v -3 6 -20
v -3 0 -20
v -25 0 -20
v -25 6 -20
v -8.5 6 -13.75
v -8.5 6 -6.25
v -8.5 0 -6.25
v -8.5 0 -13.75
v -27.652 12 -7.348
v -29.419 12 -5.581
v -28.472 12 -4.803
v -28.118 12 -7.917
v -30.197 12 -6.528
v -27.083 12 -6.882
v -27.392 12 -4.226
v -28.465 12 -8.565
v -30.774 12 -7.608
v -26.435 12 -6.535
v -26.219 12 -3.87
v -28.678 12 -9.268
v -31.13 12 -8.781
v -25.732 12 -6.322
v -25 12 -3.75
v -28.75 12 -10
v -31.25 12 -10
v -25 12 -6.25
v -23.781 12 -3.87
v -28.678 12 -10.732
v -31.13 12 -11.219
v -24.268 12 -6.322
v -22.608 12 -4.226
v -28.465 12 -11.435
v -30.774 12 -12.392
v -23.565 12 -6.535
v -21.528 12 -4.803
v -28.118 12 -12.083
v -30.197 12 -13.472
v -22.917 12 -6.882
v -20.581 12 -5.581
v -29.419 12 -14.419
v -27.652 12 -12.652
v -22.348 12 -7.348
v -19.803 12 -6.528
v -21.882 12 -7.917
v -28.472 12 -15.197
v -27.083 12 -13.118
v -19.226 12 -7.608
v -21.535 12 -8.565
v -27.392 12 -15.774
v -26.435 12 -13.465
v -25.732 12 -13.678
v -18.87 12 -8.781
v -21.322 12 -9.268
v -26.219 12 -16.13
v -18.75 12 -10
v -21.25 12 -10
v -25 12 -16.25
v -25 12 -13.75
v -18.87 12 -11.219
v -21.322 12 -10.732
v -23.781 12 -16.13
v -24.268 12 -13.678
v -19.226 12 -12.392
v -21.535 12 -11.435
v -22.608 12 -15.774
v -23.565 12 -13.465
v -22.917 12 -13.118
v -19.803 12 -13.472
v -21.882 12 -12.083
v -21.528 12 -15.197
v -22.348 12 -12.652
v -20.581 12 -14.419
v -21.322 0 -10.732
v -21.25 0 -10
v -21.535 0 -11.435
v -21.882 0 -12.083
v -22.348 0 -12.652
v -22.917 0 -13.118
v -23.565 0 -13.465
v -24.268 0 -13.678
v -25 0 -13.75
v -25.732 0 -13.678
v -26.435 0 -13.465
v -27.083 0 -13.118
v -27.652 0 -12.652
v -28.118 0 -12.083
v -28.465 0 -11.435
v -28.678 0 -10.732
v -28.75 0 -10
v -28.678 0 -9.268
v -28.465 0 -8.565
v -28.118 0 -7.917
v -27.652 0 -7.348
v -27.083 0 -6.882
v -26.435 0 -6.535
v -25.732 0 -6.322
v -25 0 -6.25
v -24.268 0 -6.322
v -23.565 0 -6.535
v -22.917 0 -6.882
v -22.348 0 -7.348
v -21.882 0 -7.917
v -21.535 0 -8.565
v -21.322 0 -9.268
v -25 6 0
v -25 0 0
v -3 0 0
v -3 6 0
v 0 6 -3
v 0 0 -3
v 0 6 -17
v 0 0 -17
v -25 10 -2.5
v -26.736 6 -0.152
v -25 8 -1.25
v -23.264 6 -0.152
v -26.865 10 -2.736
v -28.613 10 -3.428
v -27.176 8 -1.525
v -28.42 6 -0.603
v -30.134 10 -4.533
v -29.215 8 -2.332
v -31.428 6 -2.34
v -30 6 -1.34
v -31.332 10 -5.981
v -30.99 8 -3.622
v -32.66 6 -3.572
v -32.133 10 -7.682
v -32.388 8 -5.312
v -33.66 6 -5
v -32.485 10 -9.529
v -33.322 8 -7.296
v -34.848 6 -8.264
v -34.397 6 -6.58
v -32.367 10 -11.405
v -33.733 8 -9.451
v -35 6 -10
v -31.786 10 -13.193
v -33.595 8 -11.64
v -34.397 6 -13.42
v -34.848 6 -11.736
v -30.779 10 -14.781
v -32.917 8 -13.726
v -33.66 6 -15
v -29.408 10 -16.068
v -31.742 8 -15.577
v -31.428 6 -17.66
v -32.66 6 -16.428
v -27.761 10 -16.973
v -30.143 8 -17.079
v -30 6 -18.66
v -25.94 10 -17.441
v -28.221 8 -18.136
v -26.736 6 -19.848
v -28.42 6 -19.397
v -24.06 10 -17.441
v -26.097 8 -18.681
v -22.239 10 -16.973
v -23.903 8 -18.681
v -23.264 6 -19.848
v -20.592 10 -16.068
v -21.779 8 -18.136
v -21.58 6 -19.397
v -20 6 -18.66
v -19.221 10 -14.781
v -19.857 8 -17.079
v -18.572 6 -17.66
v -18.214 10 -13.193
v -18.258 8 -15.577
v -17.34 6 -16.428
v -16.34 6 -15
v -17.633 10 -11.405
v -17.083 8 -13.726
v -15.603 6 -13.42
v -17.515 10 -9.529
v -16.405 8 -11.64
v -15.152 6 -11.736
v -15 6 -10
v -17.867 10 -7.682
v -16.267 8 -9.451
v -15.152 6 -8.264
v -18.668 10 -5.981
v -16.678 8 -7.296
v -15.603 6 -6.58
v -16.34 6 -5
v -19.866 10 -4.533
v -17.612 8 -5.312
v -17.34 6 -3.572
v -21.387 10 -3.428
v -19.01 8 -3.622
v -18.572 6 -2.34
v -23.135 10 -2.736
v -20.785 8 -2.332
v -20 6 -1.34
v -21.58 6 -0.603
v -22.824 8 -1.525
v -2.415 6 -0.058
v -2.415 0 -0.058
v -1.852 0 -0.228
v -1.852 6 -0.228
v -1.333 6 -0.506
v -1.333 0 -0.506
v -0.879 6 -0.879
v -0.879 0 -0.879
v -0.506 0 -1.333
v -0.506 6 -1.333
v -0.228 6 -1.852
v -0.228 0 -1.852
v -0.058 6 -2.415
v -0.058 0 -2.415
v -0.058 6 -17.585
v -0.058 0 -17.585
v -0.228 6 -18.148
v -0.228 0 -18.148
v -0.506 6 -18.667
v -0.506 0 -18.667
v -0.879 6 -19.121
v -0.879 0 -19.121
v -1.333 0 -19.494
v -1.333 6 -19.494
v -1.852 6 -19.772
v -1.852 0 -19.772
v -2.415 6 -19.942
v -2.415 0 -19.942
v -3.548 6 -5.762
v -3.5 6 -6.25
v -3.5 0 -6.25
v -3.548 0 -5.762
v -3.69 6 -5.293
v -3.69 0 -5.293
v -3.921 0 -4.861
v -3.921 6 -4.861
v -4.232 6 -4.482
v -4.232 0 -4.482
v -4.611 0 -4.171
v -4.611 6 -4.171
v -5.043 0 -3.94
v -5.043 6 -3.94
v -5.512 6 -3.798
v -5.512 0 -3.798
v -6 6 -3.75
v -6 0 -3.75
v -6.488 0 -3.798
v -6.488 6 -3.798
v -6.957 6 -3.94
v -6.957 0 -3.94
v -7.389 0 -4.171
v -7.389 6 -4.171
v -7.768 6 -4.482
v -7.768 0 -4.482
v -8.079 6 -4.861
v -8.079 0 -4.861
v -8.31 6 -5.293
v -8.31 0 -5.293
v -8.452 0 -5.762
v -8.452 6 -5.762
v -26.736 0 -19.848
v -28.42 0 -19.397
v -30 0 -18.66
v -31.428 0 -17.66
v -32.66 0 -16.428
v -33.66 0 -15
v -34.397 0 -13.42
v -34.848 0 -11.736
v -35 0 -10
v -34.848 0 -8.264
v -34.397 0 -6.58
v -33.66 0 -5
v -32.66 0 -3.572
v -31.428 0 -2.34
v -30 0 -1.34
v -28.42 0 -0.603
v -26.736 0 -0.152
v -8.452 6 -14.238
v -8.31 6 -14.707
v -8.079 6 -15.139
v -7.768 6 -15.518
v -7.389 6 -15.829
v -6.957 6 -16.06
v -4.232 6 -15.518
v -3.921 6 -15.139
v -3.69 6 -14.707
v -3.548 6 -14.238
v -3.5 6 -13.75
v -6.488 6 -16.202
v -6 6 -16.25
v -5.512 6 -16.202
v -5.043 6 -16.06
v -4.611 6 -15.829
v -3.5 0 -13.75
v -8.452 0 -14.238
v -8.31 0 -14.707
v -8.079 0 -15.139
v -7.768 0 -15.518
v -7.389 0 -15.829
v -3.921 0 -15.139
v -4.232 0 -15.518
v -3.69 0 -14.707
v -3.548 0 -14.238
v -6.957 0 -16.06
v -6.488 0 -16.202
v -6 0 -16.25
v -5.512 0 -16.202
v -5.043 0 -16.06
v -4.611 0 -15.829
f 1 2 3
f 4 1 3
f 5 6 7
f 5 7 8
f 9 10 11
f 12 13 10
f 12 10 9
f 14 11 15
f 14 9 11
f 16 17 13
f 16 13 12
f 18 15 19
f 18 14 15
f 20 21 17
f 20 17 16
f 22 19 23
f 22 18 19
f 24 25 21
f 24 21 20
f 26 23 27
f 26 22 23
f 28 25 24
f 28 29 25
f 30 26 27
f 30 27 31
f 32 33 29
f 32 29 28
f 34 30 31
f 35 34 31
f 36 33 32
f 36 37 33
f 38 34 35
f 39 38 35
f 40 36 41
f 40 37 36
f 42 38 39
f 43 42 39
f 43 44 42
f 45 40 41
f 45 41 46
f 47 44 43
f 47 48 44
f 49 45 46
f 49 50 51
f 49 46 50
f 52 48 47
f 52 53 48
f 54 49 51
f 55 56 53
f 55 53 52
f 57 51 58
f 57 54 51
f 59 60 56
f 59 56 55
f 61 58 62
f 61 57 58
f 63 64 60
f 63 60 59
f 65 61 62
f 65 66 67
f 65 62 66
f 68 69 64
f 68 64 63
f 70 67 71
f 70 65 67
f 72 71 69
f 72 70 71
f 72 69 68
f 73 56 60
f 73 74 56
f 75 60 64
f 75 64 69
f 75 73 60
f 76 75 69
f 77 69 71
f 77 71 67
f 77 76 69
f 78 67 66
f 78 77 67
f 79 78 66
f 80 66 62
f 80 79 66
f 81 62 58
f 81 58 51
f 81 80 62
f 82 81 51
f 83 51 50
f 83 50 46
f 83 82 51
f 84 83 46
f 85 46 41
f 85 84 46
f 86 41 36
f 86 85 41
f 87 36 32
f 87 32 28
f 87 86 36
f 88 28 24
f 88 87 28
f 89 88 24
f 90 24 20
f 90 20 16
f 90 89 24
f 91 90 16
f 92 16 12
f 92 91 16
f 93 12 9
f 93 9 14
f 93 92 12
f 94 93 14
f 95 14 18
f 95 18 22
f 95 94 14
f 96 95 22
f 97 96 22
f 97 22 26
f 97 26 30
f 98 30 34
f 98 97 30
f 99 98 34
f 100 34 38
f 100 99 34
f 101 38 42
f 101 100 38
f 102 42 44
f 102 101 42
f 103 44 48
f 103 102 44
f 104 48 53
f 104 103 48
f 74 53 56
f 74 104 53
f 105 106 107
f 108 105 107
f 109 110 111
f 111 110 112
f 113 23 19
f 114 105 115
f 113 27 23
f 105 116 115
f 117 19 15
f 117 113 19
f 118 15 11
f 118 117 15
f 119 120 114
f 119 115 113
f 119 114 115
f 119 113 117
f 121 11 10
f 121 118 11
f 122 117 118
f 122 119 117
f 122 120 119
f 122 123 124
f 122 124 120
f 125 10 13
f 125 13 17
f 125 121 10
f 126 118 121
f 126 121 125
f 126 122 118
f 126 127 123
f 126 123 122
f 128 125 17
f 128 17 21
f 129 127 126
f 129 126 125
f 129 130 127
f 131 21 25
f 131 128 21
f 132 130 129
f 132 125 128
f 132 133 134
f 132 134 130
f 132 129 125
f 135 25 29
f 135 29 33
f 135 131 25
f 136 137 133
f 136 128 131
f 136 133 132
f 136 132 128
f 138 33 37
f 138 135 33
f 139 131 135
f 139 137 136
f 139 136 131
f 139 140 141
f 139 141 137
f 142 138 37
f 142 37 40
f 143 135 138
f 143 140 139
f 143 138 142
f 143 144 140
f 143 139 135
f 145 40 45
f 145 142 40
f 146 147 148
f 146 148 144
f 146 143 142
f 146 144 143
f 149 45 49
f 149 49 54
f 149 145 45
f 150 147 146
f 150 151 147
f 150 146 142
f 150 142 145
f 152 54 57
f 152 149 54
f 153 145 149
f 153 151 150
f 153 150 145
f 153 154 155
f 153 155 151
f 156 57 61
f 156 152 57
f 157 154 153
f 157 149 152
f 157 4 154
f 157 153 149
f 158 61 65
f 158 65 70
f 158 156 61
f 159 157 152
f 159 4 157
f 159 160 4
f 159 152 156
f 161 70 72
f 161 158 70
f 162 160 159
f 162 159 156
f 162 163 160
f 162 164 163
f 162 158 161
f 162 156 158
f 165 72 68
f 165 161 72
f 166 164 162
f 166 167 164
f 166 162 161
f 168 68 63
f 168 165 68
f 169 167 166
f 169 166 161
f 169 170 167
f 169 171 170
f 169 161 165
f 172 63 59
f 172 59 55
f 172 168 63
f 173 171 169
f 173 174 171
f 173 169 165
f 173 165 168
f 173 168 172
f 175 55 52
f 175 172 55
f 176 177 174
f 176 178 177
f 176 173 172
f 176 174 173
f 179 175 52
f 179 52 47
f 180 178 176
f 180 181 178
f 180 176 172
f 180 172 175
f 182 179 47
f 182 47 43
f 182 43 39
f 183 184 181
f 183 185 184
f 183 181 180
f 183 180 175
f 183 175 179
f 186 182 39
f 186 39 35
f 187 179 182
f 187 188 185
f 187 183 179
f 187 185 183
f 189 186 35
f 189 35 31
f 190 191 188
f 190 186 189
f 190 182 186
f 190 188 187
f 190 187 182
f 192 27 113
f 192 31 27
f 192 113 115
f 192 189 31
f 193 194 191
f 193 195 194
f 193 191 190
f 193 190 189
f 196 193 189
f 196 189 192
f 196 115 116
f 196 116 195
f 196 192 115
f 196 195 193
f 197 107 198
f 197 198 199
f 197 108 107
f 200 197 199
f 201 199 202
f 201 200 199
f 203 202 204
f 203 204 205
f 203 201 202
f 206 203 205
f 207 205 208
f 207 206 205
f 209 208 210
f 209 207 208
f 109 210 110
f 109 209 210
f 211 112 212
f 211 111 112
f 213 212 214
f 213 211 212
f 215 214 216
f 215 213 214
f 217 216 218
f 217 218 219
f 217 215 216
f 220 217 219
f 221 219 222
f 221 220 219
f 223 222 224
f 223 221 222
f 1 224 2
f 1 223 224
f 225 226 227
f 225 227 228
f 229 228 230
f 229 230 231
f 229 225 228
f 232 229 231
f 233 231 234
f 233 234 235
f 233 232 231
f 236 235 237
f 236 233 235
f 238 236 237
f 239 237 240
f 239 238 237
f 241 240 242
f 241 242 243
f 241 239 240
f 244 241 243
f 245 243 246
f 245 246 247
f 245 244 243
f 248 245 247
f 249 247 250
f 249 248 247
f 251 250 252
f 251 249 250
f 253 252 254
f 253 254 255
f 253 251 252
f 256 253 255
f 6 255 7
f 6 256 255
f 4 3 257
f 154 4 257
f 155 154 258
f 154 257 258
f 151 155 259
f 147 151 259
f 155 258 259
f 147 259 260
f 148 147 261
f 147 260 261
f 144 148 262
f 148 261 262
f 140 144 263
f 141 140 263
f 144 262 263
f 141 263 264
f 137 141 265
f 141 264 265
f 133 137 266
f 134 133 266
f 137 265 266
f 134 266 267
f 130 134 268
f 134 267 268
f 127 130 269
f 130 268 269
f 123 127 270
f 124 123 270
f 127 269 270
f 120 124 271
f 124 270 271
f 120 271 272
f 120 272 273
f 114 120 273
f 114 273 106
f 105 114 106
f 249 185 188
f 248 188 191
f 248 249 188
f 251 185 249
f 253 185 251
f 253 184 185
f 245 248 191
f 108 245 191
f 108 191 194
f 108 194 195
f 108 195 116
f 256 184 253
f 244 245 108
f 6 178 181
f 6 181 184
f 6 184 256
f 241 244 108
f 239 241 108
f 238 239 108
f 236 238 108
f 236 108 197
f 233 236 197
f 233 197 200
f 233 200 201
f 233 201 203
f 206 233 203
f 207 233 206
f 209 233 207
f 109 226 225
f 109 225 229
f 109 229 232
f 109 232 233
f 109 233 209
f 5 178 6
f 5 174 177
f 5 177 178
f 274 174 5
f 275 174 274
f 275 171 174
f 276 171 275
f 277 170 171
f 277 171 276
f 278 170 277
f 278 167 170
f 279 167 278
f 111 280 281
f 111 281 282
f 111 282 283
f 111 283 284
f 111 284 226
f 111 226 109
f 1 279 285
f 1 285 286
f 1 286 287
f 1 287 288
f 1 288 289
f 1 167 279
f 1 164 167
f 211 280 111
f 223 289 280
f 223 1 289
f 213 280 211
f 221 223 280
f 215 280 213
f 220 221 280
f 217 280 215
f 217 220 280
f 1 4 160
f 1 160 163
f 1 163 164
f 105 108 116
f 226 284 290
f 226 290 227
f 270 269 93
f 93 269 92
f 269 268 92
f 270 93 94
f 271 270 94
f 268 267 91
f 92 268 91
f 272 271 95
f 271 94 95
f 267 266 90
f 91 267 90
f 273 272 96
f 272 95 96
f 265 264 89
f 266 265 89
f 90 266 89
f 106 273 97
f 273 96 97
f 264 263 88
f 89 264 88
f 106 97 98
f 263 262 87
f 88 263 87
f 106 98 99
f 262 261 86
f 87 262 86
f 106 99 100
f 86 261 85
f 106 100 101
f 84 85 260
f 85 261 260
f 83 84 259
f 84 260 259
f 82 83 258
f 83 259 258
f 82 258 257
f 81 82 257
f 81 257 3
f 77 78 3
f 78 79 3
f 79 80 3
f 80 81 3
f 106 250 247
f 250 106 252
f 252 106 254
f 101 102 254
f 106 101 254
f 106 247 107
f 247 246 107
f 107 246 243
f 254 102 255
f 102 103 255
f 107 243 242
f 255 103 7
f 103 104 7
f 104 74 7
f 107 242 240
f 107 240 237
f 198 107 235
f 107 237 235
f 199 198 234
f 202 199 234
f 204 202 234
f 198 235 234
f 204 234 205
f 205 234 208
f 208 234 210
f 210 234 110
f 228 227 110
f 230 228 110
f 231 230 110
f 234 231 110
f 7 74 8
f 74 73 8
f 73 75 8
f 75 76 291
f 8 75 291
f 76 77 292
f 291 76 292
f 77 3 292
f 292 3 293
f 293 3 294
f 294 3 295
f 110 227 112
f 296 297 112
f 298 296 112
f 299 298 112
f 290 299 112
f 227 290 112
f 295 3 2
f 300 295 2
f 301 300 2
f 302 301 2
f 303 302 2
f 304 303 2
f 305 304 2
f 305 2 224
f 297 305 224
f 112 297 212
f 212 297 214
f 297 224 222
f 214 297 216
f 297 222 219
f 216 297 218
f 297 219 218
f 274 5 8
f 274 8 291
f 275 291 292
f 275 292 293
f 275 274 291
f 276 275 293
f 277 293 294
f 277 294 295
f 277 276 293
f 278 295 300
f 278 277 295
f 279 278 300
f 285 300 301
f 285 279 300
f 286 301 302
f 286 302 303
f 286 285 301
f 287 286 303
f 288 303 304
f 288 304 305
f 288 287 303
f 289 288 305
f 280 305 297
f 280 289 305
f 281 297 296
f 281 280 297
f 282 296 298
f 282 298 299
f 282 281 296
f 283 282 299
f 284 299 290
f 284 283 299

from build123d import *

# Parameters (mm, degrees)
Y_KSEKLIK_EKSTR_ZYON1_DEPTH = 6
IZIM2_R                     = 6.25
IZIM2_R_2                   = 3.75
Y_KSEKLIK_EKSTR_ZYON2_DEPTH = 6
KES_EKSTR_ZYON1_DEPTH       = 6
IZIM5_R                     = 3.75
KES_EKSTR_ZYON2_DEPTH       = 6
RADYUS1_R                   = 3
RADYUS2_R                   = 3


with BuildPart() as part:
    # Çizim1 → Yükseklik-Ekstrüzyon1 (new body)
    with BuildSketch(Plane(origin=(0, 0, 0), x_dir=(1, 0, 0), z_dir=(0, 1, 0))):
        with BuildLine():
            ThreePointArc((-25, 20), (-35, 10), (-25, 0))
            Line((-25, 0), (-25, 20))
        make_face()
        with BuildLine():
            Line((-25, 20), (-25, 0))
            ThreePointArc((-25, 0), (-17.928932188, 2.928932188), (-15, 10))
            ThreePointArc((-15, 10), (-17.928932188, 17.071067812), (-25, 20))
        make_face()
        with BuildLine():
            Line((-25, 0), (0, 0))
            Line((0, 0), (0, 20))
            Line((0, 20), (-25, 20))
            ThreePointArc((-25, 20), (-17.928932188, 17.071067812), (-15, 10))
            ThreePointArc((-15, 10), (-17.928932188, 2.928932188), (-25, 0))
        make_face()
    extrude(amount=Y_KSEKLIK_EKSTR_ZYON1_DEPTH)

    # Çizim2 → Yükseklik-Ekstrüzyon2 (add)
    with BuildSketch(Plane(origin=(0, 6, 0), x_dir=(1, 0, 0), z_dir=(0, 1, 0))):
        with Locations((-25, 10)):
            Circle(IZIM2_R)
        with Locations((-25, 10)):
            Circle(IZIM2_R_2, mode=Mode.SUBTRACT)
    extrude(amount=Y_KSEKLIK_EKSTR_ZYON2_DEPTH)

    # Çizim4 → Kes-Ekstrüzyon1 (cut)
    with BuildSketch(Plane(origin=(0, 6, 0), x_dir=(1, 0, 0), z_dir=(0, 1, 0))):
        with BuildLine():
            Line((-3.5, 13.75), (-3.5, 6.25))
            ThreePointArc((-3.5, 6.25), (-6, 3.75), (-8.5, 6.25))
            Line((-8.5, 6.25), (-8.5, 13.75))
            ThreePointArc((-8.5, 13.75), (-6, 16.25), (-3.5, 13.75))
        make_face()
    extrude(amount=-KES_EKSTR_ZYON1_DEPTH, mode=Mode.SUBTRACT)

    # Çizim5 → Kes-Ekstrüzyon2 (cut)
    with BuildSketch(Plane(origin=(0, 6, 0), x_dir=(1, 0, 0), z_dir=(0, 1, 0))):
        with Locations((-25, 10)):
            Circle(IZIM5_R)
    extrude(amount=-KES_EKSTR_ZYON2_DEPTH, mode=Mode.SUBTRACT)

    # Radyus1
    radyus1_edges = [part.edges().sort_by_distance(p)[0] for p in [
        (0, 3, 0),
    ]]
    fillet(radyus1_edges, radius=RADYUS1_R)

    # Radyus2
    radyus2_edges = [part.edges().sort_by_distance(p)[0] for p in [
        (0, 3, -20),
    ]]
    fillet(radyus2_edges, radius=RADYUS2_R)

    # Çizim6 → Döndür1 (revolve)
    with BuildSketch(Plane(origin=(-25, 0, 0), x_dir=(0, 0, -1), z_dir=(1, 0, 0))):
        Polygon((3.75, 12), (0, 6), (3.75, 6), align=None)
    revolve(axis=Axis((-25, 12, -10), (0, -1, 0)))


solid = part.part
